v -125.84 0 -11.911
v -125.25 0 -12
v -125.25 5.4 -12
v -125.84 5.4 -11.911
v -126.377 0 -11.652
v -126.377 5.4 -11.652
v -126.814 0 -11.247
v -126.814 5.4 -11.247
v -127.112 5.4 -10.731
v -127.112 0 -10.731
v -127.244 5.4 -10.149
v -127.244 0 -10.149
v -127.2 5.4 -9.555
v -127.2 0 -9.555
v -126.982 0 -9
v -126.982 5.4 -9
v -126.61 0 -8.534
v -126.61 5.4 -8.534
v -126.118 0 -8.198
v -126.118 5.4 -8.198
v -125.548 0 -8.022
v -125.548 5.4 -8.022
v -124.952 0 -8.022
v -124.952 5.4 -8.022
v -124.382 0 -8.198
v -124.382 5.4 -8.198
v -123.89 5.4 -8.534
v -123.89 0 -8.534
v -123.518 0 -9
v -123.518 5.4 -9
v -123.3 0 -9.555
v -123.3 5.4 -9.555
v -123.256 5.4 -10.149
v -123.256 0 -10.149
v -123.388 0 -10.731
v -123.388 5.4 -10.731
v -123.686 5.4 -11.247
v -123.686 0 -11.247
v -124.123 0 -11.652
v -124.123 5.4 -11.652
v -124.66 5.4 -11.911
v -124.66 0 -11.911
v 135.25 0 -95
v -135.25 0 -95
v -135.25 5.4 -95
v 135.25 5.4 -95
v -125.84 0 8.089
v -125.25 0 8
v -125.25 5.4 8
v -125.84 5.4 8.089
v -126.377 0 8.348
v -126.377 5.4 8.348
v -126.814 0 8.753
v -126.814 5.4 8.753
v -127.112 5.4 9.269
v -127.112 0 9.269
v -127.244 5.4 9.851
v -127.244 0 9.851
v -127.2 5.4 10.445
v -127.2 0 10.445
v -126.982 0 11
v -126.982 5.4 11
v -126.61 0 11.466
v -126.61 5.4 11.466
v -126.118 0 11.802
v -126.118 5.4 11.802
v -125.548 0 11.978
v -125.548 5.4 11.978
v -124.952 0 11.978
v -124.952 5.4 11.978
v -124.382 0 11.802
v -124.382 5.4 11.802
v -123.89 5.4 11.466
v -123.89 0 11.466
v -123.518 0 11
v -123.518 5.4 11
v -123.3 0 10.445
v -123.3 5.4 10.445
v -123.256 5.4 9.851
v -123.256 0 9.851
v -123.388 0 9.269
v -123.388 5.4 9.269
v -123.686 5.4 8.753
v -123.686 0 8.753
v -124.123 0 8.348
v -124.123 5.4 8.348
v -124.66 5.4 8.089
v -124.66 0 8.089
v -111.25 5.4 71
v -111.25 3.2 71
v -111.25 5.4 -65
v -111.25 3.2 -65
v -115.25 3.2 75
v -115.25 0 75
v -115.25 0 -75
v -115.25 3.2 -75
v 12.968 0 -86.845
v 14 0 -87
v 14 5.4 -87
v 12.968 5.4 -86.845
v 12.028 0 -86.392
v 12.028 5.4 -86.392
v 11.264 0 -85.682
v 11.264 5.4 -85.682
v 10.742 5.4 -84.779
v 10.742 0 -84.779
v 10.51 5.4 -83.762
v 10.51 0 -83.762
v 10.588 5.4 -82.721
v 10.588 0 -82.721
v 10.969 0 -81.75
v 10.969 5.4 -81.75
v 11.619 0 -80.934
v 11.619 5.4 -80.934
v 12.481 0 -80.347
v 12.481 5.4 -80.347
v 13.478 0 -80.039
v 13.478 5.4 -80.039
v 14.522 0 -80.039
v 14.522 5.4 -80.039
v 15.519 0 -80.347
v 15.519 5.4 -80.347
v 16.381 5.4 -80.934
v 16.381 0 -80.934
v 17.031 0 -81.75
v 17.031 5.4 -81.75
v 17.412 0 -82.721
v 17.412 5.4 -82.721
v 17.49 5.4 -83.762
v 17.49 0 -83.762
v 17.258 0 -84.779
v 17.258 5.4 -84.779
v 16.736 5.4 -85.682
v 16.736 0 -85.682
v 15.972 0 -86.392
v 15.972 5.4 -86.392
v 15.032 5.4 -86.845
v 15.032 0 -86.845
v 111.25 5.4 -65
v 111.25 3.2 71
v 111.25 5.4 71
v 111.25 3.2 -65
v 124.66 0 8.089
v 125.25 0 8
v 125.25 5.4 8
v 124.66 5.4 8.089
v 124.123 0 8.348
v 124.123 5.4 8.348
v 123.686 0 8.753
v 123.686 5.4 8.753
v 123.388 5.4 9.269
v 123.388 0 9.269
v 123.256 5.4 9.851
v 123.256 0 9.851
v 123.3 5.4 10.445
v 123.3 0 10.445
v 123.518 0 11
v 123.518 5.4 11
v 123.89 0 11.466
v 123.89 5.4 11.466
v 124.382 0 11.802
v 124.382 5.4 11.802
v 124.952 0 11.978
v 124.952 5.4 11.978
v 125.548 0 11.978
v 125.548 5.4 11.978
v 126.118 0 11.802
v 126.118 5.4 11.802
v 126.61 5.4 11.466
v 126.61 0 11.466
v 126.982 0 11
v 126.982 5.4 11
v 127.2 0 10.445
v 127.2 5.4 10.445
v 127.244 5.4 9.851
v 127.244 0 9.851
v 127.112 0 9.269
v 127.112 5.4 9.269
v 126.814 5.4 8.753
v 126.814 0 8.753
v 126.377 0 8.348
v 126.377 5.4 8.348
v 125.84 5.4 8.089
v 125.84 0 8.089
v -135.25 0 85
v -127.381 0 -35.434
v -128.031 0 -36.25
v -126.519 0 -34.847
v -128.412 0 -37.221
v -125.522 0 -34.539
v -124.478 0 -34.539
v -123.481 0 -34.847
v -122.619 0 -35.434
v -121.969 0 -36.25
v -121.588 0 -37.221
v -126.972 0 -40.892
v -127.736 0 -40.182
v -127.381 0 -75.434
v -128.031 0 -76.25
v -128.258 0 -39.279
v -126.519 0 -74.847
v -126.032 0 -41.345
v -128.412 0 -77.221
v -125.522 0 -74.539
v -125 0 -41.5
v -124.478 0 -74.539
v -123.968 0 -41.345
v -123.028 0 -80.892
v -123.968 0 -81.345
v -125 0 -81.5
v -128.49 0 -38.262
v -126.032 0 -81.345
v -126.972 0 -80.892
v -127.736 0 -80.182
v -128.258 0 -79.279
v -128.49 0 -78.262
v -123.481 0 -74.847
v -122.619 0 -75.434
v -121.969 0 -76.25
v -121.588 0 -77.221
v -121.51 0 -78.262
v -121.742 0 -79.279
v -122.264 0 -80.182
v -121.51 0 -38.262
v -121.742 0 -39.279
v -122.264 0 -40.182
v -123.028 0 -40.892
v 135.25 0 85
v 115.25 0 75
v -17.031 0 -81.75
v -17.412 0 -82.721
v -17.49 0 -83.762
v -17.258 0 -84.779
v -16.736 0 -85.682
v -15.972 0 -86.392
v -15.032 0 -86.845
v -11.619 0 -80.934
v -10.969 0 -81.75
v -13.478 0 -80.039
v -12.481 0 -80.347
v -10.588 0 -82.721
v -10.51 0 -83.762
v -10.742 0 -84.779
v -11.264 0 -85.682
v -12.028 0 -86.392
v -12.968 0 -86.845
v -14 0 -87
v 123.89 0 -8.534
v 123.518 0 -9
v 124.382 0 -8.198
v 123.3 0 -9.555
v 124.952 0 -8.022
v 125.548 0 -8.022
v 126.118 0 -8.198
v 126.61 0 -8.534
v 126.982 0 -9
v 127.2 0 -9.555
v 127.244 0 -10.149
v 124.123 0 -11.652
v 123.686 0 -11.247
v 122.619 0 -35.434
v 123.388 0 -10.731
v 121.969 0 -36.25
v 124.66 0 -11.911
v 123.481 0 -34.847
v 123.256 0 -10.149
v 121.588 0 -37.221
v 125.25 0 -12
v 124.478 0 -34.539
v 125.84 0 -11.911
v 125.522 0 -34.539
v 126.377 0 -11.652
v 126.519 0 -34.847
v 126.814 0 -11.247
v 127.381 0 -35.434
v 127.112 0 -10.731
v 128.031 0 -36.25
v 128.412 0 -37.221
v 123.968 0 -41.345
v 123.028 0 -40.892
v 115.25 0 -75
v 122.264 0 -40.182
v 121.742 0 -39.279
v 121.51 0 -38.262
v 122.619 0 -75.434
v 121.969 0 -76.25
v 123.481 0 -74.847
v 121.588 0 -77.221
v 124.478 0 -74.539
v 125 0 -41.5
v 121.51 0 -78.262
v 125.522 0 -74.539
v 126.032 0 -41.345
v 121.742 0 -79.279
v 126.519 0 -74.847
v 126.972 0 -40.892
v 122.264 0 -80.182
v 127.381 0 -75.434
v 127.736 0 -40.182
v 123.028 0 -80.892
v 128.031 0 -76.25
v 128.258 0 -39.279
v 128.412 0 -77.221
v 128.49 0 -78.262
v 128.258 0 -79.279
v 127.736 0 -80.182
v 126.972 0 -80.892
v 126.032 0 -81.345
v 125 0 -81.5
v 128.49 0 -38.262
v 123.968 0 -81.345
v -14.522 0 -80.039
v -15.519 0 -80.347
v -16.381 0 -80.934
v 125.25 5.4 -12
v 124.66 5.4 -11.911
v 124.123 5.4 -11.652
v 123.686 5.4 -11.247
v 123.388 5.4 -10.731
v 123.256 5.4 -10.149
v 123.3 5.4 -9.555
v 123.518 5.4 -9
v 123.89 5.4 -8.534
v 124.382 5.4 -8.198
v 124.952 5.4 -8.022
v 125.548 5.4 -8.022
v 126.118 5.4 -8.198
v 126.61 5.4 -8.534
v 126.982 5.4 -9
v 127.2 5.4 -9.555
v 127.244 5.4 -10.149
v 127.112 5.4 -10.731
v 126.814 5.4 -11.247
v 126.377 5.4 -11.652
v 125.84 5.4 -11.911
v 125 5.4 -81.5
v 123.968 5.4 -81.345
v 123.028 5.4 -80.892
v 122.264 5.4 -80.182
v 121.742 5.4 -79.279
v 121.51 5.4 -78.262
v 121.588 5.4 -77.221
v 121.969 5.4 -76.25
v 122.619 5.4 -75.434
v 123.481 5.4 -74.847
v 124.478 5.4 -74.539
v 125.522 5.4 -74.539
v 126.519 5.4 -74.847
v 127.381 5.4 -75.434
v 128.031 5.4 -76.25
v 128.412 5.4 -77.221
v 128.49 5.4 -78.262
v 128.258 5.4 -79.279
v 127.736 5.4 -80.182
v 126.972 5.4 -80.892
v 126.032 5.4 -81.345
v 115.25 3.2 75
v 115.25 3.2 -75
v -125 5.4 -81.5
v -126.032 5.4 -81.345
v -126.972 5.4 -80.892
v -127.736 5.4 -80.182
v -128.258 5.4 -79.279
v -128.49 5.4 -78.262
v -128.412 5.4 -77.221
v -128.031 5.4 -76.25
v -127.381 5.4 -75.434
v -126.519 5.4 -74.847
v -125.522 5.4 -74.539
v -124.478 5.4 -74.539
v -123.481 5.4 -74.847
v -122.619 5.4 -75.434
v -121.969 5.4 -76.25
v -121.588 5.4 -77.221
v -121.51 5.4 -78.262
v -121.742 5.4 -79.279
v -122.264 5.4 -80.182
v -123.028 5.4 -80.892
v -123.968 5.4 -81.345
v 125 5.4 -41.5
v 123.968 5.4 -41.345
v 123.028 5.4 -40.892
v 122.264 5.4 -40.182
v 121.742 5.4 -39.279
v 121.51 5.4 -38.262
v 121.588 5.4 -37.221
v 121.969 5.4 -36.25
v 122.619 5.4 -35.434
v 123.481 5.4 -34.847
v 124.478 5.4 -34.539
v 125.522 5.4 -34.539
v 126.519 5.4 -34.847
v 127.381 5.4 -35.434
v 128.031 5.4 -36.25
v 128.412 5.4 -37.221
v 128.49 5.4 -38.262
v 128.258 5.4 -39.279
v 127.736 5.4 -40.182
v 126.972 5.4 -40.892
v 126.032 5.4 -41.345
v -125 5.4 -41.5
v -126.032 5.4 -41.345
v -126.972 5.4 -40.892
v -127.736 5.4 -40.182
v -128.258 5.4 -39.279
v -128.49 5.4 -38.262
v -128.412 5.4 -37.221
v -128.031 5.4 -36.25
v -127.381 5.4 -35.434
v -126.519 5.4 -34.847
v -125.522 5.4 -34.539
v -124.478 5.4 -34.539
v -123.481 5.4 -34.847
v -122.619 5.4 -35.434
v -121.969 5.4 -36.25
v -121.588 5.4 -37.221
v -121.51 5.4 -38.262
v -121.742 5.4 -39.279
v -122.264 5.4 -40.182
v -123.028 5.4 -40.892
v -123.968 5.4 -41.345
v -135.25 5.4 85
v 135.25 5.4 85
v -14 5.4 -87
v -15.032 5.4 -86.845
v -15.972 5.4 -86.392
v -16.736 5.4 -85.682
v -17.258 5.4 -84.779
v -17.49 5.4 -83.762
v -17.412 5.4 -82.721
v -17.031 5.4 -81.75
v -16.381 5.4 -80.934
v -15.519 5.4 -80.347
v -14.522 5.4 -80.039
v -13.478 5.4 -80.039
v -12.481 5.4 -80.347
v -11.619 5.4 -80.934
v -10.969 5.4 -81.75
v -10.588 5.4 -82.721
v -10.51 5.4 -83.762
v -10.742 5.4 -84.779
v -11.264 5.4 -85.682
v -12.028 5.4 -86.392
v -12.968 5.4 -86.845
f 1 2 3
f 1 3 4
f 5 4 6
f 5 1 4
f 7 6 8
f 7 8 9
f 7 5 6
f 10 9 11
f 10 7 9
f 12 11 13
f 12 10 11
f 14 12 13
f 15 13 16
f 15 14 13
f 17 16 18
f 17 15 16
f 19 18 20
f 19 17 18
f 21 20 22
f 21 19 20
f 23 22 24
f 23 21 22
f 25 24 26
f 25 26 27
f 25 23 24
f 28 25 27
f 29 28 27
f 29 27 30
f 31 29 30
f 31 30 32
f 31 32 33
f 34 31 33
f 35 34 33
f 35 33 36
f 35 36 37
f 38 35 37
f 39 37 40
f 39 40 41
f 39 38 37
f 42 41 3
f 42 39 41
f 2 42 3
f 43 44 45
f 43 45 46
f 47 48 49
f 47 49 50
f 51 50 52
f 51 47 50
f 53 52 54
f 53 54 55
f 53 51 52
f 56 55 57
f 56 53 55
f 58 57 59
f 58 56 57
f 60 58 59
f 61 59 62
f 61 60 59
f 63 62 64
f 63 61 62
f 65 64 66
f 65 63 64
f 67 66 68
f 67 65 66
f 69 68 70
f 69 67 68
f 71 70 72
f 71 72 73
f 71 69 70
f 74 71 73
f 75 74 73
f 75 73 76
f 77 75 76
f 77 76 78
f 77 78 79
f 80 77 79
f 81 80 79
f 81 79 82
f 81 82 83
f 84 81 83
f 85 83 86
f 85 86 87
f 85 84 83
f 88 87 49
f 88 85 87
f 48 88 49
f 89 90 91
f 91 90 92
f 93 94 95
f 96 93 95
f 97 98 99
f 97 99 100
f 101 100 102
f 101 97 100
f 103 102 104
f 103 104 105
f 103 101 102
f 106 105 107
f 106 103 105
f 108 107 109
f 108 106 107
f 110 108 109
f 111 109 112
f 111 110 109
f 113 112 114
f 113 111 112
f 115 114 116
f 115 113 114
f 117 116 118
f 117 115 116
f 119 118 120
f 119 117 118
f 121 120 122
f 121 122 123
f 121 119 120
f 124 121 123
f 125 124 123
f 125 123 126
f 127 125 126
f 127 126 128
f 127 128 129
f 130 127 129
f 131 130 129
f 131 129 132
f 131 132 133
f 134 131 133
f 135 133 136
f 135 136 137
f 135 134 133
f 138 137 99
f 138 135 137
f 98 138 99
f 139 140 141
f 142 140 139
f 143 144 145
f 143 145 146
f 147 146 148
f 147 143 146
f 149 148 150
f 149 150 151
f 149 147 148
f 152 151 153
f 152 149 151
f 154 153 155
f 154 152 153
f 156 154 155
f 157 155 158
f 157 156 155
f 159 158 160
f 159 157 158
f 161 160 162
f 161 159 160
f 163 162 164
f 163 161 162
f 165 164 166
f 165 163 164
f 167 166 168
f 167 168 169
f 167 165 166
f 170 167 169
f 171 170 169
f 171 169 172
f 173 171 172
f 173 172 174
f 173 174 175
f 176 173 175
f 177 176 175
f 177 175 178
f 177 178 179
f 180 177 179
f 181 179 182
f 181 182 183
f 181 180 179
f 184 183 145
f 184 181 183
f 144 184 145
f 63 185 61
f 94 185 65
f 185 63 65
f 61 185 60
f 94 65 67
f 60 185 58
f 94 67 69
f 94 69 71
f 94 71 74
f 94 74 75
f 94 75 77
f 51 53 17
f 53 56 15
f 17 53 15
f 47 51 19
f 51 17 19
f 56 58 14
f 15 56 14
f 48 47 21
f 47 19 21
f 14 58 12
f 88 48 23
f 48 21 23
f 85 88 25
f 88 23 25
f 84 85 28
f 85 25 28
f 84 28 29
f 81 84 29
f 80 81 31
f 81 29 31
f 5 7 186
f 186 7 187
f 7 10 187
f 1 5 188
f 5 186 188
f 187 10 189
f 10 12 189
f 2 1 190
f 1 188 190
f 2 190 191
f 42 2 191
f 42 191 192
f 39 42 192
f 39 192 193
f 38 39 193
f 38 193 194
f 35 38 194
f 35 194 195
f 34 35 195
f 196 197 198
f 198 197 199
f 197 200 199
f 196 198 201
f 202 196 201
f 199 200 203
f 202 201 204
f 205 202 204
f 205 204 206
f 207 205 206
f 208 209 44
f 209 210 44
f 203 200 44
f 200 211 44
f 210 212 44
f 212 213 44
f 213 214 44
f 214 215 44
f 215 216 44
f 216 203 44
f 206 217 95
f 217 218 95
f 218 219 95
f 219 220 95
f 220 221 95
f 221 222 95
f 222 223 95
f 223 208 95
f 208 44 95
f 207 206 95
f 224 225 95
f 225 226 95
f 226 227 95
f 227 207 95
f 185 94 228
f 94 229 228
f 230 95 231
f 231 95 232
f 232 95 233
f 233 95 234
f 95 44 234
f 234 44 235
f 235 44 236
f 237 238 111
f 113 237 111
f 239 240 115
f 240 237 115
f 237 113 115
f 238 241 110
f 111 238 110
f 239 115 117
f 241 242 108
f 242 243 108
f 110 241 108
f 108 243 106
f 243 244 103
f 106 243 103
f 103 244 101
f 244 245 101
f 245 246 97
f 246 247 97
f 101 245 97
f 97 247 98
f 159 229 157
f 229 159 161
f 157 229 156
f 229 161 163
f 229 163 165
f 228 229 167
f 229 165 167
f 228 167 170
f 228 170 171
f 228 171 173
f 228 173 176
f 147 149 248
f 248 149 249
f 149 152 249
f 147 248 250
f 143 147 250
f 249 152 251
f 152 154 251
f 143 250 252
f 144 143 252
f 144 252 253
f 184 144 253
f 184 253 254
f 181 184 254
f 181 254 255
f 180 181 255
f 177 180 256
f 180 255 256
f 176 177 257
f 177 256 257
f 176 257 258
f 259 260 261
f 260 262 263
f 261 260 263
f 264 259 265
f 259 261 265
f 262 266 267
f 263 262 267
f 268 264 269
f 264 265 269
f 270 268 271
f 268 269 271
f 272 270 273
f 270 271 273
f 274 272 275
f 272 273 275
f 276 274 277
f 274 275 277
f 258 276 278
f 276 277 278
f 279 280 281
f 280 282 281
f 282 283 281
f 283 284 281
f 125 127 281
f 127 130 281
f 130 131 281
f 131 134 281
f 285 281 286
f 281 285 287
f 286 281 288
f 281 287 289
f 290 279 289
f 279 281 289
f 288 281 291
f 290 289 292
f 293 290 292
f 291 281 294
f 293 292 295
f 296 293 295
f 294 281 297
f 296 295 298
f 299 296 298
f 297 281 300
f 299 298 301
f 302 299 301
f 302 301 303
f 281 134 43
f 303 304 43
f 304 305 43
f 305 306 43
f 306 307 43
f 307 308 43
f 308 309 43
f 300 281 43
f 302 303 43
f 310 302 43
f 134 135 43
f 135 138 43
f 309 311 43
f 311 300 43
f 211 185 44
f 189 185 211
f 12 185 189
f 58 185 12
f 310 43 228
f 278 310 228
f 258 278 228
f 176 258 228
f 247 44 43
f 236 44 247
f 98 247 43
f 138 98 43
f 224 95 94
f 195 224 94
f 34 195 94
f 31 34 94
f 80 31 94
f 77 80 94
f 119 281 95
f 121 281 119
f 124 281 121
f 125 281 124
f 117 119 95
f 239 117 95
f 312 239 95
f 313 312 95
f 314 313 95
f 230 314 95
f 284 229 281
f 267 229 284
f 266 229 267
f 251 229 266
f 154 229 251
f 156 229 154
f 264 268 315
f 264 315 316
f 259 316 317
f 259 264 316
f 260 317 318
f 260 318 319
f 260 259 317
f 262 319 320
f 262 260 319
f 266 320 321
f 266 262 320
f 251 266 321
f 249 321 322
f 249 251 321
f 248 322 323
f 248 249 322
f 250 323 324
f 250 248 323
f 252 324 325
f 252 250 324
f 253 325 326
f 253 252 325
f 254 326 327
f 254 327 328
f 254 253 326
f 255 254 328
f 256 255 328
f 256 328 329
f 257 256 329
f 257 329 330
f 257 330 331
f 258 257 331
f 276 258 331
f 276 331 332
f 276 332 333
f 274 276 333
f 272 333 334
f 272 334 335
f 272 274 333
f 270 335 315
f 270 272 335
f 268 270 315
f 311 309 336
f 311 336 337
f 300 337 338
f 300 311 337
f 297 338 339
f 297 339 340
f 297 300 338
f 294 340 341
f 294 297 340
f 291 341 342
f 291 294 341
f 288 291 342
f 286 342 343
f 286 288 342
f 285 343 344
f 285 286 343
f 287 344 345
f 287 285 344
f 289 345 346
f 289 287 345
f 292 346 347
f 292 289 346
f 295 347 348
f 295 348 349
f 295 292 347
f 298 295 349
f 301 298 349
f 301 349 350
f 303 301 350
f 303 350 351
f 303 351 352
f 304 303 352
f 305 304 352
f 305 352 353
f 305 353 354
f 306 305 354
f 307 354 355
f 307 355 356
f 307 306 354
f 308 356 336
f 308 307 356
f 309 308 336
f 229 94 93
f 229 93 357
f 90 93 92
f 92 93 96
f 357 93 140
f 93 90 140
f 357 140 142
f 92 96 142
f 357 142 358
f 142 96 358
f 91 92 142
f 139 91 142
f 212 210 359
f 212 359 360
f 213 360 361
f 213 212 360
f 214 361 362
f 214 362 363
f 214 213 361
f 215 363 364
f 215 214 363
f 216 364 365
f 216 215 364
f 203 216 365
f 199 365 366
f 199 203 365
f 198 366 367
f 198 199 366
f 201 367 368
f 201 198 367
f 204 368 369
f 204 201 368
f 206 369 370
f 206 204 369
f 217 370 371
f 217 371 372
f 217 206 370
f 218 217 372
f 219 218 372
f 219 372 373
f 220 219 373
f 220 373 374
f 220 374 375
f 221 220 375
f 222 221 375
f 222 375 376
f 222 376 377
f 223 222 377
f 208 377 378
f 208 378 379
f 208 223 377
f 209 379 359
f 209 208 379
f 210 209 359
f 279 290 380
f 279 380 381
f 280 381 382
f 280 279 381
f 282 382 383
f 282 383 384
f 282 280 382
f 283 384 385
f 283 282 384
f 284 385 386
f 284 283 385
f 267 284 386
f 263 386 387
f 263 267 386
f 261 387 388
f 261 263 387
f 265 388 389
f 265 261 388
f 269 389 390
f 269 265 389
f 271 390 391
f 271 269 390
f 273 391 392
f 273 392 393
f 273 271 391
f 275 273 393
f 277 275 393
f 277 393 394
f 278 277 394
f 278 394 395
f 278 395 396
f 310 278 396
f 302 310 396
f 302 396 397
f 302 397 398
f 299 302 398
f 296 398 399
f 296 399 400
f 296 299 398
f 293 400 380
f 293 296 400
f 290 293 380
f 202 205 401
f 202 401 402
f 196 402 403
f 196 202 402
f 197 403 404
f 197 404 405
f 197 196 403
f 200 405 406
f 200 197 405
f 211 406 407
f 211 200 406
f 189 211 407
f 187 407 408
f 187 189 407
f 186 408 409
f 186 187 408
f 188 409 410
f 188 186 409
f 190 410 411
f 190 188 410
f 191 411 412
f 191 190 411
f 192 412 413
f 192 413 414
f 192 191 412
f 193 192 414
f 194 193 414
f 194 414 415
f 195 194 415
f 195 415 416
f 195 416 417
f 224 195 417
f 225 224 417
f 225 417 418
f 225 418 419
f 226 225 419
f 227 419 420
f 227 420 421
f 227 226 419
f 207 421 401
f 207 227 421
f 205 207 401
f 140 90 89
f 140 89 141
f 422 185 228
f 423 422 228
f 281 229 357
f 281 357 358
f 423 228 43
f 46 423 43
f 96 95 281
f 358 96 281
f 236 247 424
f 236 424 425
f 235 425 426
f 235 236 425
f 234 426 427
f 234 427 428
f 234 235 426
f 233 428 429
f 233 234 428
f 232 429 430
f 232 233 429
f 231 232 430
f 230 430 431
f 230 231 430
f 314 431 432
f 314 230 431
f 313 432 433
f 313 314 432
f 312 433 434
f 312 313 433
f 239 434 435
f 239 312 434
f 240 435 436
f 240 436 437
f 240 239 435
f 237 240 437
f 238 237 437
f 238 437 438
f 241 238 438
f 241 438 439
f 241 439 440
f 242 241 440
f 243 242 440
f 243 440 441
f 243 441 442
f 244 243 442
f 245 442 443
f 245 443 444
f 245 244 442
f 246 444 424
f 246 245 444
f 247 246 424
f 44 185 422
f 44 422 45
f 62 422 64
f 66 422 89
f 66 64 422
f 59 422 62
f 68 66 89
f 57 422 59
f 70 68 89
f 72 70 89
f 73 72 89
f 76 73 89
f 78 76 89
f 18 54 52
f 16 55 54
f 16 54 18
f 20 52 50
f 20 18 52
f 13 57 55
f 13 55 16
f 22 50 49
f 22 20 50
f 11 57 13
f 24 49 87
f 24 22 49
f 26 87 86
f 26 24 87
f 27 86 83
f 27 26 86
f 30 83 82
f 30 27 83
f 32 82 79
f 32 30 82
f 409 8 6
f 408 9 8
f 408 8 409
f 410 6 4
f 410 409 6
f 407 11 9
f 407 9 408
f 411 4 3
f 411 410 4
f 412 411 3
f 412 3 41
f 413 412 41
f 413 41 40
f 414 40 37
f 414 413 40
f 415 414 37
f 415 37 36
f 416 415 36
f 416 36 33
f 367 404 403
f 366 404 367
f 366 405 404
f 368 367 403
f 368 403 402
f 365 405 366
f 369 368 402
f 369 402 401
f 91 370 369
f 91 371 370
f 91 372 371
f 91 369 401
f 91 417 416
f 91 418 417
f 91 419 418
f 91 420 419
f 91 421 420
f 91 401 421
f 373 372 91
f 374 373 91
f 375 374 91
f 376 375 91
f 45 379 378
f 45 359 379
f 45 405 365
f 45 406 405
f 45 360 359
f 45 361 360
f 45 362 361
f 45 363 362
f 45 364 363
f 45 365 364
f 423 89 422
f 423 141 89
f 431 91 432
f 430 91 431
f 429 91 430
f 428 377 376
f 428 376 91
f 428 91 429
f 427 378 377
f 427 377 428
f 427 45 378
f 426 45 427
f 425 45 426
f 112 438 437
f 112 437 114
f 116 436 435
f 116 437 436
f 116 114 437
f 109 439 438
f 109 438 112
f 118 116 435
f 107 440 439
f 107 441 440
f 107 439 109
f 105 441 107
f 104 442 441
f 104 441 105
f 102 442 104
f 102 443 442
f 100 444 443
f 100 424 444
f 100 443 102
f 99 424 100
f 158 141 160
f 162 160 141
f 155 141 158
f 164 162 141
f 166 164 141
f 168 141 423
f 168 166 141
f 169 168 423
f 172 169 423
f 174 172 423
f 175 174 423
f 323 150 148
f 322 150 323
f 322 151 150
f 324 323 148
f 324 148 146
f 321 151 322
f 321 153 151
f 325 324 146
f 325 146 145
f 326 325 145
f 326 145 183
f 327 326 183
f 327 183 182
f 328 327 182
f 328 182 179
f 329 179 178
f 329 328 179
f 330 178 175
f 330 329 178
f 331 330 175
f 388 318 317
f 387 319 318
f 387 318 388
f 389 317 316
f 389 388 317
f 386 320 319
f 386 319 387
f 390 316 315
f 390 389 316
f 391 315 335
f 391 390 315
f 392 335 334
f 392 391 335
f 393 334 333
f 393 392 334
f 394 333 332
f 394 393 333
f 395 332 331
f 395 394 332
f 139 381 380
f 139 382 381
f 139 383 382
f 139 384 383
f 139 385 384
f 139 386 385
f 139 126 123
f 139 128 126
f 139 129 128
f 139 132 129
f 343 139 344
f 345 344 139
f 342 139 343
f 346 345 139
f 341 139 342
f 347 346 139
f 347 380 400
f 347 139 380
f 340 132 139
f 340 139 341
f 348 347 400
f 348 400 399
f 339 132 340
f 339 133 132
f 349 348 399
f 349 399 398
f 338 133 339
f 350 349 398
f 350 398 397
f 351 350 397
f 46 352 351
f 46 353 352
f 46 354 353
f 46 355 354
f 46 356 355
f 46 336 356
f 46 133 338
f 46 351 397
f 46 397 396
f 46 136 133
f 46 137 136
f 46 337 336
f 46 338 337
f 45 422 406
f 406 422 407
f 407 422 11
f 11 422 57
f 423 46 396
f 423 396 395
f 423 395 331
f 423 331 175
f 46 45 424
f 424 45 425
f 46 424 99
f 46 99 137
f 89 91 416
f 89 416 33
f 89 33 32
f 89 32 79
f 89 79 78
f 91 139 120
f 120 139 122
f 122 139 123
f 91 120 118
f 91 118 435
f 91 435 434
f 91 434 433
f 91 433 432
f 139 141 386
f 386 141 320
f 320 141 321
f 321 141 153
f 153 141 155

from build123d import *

# Parameters (mm, degrees)
SKETCH1_W           = 270.5
SKETCH1_H           = 180
SKETCH1_R           = 2
SKETCH1_R_2         = 3.5
SKETCH1_W_2         = 222.5
SKETCH1_H_2         = 136
BOSS_EXTRUDE1_DEPTH = 5.4
SKETCH1_5_W         = 230.5
SKETCH1_5_H         = 150
CUT_EXTRUDE1_DEPTH  = 3.2


with BuildPart() as part:
    # Sketch1 → Boss-Extrude1 (new body)
    with BuildSketch(Plane(origin=(0, 0, 0), x_dir=(1, 0, 0), z_dir=(0, 1, 0))):
        with Locations((0, 5)):
            Rectangle(SKETCH1_W, SKETCH1_H)
        with Locations(Location((-125.25, -10, 0), (0, 0, 90))):
            Circle(SKETCH1_R, mode=Mode.SUBTRACT)
        with Locations(Location((125.25, -10, 0), (0, 0, 90))):
            Circle(SKETCH1_R, mode=Mode.SUBTRACT)
        with Locations(Location((-125.25, 10, 0), (0, 0, 90))):
            Circle(SKETCH1_R, mode=Mode.SUBTRACT)
        with Locations(Location((-125, 38, 0), (0, 0, 90))):
            Circle(SKETCH1_R_2, mode=Mode.SUBTRACT)
        with Locations(Location((-125, 78, 0), (0, 0, 90))):
            Circle(SKETCH1_R_2, mode=Mode.SUBTRACT)
        with Locations(Location((-14, 83.5, 0), (0, 0, 90))):
            Circle(SKETCH1_R_2, mode=Mode.SUBTRACT)
        with Locations((0, -3)):
            Rectangle(SKETCH1_W_2, SKETCH1_H_2, mode=Mode.SUBTRACT)
        with Locations(Location((125.25, 10, 0), (0, 0, 90))):
            Circle(SKETCH1_R, mode=Mode.SUBTRACT)
        with Locations(Location((125, 38, 0), (0, 0, 90))):
            Circle(SKETCH1_R_2, mode=Mode.SUBTRACT)
        with Locations(Location((14, 83.5, 0), (0, 0, 90))):
            Circle(SKETCH1_R_2, mode=Mode.SUBTRACT)
        with Locations(Location((125, 78, 0), (0, 0, 90))):
            Circle(SKETCH1_R_2, mode=Mode.SUBTRACT)
    extrude(amount=BOSS_EXTRUDE1_DEPTH)

    # Sketch1<5> → Cut-Extrude1 (cut)
    with BuildSketch(Plane(origin=(0, 0, 0), x_dir=(1, 0, 0), z_dir=(0, 1, 0))):
        Rectangle(SKETCH1_5_W, SKETCH1_5_H)
    extrude(amount=CUT_EXTRUDE1_DEPTH, mode=Mode.SUBTRACT)


solid = part.part
